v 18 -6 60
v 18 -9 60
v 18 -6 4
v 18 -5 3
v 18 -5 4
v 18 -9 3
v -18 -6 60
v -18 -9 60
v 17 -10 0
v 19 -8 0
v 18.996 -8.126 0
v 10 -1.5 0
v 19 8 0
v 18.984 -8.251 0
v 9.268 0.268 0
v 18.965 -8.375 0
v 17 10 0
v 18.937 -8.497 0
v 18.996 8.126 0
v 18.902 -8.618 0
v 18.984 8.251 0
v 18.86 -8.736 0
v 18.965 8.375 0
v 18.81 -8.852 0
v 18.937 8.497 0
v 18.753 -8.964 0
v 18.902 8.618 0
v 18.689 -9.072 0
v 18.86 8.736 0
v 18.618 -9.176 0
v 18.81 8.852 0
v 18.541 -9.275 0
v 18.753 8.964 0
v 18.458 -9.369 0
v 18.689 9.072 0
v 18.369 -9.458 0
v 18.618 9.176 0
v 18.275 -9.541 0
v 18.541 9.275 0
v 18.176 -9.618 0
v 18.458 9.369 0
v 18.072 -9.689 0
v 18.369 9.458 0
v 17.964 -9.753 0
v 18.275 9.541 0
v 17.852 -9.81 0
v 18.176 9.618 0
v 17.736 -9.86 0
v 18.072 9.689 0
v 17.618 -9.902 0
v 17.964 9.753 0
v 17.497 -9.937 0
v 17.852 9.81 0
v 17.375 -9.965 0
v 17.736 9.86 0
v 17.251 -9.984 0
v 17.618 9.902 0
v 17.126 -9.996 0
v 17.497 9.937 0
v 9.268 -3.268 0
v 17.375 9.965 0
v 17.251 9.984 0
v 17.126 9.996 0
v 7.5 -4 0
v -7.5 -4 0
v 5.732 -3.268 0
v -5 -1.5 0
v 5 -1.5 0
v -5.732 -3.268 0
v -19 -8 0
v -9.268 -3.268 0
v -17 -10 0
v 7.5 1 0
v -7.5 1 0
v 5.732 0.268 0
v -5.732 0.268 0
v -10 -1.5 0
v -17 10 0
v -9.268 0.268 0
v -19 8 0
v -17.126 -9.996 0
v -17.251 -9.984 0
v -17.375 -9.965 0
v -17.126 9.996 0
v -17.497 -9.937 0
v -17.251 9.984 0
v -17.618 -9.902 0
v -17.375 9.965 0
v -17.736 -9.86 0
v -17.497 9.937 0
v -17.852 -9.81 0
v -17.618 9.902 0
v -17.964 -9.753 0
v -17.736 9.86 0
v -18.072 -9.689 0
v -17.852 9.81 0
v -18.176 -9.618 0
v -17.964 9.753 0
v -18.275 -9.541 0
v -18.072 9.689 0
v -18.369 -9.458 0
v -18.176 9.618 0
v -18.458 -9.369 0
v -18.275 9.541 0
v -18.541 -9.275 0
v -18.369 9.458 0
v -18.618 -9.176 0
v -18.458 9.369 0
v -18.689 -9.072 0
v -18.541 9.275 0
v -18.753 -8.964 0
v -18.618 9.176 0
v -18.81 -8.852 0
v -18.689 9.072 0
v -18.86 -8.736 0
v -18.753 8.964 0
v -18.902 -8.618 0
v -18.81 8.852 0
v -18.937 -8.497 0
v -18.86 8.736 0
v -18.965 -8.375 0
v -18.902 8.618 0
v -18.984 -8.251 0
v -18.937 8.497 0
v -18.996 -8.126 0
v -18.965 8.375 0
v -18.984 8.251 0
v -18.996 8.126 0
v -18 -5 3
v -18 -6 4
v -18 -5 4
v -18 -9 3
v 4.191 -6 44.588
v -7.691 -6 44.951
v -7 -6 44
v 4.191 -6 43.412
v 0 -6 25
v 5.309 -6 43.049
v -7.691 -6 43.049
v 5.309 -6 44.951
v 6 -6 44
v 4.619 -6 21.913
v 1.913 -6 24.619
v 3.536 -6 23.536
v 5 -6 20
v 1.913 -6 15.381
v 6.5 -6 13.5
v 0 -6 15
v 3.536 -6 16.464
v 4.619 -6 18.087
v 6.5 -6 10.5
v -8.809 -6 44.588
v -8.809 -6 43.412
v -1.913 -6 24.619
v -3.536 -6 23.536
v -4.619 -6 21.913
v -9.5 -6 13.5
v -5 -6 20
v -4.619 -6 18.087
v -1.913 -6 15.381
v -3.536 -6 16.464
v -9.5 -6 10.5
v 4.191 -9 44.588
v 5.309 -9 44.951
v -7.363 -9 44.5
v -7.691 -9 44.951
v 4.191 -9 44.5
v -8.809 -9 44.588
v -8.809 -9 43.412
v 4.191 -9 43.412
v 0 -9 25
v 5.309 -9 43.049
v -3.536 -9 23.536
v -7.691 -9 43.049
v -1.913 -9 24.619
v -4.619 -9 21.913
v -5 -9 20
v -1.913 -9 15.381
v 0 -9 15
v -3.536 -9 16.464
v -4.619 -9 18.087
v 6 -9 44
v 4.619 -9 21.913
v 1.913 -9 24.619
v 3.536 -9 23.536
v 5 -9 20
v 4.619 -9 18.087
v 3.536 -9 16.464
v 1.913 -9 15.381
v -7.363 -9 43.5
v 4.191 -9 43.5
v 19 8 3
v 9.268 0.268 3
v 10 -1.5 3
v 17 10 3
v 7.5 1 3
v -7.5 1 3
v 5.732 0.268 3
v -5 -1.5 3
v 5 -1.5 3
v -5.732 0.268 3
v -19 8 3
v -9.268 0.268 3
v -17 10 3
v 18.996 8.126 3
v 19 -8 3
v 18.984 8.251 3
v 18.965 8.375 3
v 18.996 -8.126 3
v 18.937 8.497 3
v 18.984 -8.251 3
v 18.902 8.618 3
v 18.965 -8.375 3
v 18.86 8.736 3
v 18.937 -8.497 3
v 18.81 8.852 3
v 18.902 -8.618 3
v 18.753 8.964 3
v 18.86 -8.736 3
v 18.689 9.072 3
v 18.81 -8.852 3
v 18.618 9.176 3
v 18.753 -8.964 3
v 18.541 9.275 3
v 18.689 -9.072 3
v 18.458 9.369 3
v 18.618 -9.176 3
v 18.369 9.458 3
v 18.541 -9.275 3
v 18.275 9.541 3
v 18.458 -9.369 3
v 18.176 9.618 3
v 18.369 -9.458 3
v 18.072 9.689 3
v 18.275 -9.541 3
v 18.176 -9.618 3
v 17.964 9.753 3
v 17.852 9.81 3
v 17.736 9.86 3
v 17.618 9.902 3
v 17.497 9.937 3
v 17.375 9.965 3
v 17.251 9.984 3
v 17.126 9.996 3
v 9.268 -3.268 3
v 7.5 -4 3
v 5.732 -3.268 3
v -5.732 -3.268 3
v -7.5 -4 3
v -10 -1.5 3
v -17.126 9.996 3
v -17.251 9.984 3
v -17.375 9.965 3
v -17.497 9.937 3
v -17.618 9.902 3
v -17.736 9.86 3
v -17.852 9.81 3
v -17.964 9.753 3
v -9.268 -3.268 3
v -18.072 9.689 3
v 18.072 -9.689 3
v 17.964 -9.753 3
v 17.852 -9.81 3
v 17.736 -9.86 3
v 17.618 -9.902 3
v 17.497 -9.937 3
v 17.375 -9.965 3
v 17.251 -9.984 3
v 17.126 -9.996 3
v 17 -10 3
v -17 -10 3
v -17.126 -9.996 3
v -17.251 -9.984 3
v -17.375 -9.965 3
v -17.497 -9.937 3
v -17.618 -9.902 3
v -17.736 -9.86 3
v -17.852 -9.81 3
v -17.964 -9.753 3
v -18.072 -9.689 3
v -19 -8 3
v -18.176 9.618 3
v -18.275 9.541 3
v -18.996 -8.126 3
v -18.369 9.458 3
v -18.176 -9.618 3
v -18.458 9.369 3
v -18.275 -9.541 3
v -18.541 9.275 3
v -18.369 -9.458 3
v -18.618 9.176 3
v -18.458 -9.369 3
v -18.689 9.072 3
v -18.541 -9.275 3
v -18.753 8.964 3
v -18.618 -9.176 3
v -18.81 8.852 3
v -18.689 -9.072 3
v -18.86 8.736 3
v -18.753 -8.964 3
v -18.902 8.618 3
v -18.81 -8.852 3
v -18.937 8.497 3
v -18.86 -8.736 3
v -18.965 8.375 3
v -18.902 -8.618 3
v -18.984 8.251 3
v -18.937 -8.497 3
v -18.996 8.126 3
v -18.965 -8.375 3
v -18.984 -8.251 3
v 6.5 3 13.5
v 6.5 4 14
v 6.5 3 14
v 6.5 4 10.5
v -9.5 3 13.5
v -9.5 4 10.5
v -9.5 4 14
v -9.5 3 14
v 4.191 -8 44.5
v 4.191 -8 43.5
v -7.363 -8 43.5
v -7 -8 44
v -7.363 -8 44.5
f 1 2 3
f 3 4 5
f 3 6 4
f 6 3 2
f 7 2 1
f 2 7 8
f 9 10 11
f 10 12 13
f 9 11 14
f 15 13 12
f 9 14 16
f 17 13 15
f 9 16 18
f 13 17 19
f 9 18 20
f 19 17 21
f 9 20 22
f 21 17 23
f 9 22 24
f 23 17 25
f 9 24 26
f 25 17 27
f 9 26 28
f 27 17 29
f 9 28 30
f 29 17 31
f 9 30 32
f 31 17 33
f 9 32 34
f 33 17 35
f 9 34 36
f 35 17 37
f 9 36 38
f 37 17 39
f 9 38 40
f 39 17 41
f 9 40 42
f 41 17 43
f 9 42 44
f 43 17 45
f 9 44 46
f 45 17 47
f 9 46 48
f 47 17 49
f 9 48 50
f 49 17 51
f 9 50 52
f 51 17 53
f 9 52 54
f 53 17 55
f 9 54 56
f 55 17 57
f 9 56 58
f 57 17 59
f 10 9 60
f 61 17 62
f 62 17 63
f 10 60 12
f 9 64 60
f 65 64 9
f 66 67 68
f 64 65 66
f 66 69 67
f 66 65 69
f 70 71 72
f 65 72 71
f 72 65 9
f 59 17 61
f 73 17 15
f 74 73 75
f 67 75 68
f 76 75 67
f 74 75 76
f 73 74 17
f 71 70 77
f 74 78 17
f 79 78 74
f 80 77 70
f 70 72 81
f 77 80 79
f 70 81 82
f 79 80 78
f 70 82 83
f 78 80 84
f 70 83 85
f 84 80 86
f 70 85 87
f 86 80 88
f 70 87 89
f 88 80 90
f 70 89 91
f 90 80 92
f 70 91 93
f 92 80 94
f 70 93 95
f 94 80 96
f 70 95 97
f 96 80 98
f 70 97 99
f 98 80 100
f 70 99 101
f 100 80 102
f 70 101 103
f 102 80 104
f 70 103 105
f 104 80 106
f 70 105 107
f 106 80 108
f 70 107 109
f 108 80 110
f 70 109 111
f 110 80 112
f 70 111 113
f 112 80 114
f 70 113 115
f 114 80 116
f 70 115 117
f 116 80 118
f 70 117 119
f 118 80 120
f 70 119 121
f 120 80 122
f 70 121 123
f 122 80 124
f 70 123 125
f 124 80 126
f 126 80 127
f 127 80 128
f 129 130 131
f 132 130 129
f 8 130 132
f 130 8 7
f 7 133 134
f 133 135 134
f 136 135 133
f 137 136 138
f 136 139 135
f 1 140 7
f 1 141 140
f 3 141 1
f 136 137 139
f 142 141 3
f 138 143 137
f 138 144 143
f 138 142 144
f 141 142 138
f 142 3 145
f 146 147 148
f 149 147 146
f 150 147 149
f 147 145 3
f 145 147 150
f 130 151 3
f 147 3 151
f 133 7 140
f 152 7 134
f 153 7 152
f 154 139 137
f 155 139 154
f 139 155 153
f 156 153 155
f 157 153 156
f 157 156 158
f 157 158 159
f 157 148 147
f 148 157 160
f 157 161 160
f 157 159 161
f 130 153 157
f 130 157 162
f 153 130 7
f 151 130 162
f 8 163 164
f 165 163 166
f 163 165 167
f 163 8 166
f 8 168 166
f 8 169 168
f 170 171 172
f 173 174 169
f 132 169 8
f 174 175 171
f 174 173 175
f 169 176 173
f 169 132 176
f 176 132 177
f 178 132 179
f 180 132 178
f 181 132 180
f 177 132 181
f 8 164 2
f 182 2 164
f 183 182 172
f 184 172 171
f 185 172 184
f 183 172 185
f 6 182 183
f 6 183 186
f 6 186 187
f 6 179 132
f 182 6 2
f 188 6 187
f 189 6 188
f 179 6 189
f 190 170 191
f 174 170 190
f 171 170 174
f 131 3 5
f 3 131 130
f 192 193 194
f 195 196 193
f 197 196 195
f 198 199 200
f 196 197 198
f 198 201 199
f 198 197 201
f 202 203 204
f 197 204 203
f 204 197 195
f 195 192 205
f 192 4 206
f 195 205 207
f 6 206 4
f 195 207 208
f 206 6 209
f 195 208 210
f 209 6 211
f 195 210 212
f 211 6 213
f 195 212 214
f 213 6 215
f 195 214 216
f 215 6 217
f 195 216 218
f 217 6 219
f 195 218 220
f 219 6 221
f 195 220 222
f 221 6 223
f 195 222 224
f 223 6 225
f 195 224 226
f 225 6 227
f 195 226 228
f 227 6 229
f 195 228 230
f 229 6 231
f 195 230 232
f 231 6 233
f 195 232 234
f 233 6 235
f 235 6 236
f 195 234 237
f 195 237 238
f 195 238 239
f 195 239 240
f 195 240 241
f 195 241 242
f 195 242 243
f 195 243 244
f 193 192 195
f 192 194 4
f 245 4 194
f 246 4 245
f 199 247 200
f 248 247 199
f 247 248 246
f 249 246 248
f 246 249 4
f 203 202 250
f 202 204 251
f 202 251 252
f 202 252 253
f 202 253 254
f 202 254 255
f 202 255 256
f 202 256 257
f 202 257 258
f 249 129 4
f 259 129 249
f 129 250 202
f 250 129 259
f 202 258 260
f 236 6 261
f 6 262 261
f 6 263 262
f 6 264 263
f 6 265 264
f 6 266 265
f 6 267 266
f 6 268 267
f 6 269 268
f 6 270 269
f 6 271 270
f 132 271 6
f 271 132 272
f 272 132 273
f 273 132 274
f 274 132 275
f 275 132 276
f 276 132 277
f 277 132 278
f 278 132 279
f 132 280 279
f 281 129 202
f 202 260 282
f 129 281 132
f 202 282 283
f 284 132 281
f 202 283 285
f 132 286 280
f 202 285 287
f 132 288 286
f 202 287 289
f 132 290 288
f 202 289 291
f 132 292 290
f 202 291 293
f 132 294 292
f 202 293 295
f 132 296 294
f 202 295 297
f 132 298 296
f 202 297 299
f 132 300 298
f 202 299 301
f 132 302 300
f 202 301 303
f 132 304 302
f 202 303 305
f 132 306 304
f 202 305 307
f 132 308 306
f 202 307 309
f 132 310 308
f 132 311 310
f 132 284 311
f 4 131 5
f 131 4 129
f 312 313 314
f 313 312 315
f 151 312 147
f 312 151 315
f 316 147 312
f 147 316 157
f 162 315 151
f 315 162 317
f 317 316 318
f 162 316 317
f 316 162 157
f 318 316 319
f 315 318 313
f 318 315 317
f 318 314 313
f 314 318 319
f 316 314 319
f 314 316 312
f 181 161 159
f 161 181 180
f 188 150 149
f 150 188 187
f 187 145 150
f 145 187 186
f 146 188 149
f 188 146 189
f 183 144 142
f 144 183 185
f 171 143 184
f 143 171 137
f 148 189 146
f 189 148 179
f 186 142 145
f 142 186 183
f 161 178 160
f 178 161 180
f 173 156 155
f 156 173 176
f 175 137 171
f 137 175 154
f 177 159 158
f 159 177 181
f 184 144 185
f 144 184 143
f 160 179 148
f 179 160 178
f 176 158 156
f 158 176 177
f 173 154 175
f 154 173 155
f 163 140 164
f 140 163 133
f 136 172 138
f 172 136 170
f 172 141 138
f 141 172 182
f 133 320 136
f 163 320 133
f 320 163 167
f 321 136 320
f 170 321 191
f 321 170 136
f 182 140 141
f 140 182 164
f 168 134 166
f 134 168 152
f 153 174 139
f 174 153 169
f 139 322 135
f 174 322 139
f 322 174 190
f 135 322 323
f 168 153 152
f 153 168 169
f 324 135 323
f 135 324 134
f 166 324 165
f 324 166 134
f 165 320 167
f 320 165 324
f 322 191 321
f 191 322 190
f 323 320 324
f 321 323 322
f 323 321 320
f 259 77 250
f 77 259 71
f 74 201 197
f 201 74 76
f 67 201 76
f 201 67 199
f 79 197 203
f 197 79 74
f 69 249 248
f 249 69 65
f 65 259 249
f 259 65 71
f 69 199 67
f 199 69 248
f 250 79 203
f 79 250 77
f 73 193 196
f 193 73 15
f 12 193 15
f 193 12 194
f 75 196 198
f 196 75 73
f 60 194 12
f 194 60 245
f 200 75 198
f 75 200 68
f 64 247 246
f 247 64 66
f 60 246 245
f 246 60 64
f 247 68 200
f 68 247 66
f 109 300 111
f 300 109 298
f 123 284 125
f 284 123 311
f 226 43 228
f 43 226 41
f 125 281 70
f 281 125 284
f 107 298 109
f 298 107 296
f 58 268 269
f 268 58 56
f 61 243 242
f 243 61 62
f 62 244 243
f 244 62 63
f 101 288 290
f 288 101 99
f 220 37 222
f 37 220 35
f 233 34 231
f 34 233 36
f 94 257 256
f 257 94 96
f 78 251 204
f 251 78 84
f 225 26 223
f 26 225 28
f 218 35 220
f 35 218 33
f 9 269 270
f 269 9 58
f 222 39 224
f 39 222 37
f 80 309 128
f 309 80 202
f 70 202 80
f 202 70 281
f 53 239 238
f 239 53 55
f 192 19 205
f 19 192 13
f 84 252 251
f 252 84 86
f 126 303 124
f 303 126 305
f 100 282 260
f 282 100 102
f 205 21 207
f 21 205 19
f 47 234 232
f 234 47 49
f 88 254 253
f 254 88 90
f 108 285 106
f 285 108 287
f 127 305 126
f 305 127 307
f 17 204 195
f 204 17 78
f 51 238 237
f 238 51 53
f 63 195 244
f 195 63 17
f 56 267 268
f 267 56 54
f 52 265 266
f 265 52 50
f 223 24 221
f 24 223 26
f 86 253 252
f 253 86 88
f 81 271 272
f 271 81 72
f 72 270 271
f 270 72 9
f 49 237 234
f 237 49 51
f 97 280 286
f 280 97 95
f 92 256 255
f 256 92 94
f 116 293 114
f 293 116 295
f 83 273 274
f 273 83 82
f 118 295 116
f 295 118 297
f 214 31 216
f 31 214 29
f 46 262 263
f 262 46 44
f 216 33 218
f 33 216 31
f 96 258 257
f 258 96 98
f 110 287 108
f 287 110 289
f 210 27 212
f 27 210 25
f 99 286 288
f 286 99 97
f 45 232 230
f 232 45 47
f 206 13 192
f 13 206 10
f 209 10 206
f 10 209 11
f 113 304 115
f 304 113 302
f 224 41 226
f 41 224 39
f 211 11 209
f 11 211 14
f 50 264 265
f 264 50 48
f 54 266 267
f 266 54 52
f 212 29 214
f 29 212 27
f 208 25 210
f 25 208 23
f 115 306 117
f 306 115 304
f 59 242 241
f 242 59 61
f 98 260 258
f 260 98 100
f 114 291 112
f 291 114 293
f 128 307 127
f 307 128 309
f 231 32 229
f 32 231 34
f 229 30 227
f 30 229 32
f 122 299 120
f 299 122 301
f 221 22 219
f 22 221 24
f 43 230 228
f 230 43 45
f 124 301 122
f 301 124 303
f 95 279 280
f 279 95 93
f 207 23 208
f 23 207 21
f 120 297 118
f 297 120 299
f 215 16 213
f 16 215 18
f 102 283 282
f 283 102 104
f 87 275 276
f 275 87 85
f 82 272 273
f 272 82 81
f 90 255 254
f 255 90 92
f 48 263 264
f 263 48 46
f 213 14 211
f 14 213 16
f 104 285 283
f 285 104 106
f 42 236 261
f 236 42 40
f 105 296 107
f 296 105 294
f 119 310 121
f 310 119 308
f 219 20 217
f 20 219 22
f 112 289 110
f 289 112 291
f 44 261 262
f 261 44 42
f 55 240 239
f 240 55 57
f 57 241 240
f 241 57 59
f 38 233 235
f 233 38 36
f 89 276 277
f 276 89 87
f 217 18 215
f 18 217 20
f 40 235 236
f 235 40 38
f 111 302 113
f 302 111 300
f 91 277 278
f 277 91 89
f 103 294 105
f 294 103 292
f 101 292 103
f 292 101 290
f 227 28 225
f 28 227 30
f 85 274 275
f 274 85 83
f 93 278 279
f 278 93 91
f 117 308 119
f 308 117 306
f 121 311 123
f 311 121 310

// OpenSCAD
// Right-side ear and mounting assembly.
thickness  = 3;
mic_radius=5;
fillet = 1;
radius = 2.5;  // Hole radius
bottom_length = 36;
bottom_width = 18;
board_depth = 6;
board_width=16;  // Center of microphone is 6 from edge
ear_hole_height = 20;
vertical_height = 60;
// Returns a plate centered on the origin
module bottom() {
    round_radius=2;  // Radius of the corner arcs
    x = bottom_length;
    y = bottom_width;
    $fn=100;
    linear_extrude(height=thickness) {
        hull() {
            // place 4 circles in the corners, with the given radius
            translate([(-x/2)+(round_radius/2), (-y/2)+(round_radius/2), 0])
            circle(r=round_radius);

            translate([(x/2)-(round_radius/2), (-y/2)+(round_radius/2), 0])
            circle(r=round_radius);

            translate([(-x/2)+(round_radius/2), (y/2)-(round_radius/2), 0])
            circle(r=round_radius);

            translate([(x/2)-(round_radius/2), (y/2)-(round_radius/2), 0])
            circle(r=round_radius);
        }
    }
}

// Include fillet support
module vertical() {
    difference() {
        union() {
            translate([-bottom_length/2,-bottom_width/2,0]) {
                cube([bottom_length,thickness,vertical_height]);
            }
            translate([-bottom_length/2,-bottom_width/2+thickness,thickness]) {
                cube([bottom_length,fillet,fillet]);
            }
            translate([-board_width/2-1.5,-bottom_width/2+thickness,
                        ear_hole_height-mic_radius-3*thickness/2]) {
                cube([board_width,board_depth+thickness+fillet,thickness]);
            }
            translate([-board_width/2-1.5,-bottom_width/2+2*thickness+board_depth,
                        ear_hole_height-mic_radius-thickness+fillet]) {
                cube([board_width,fillet,fillet]);
            }
        }
        translate([0,-bottom_width/2,ear_hole_height]) {
            rotate([-90,0,0]) cylinder(3*thickness,mic_radius,mic_radius,true);
        };
        // 1mm holes. Only way I can think of to fasten board
        translate([mic_radius,-bottom_width/2,ear_hole_height+24]) {
            rotate([-90,0,0]) cylinder(3*thickness,1,1,true);
        }
        // 1mm holes. Only way I can think of to fasten board
        translate([mic_radius-13,-bottom_width/2,ear_hole_height+24]) {
            rotate([-90,0,0]) cylinder(3*thickness,1,1,true);
        }
        // Score a line on the "ear" side for a paper-clip wire
        translate([mic_radius-13,-bottom_width/2,ear_hole_height+24-fillet/2]) {
            cube([13,fillet,fillet]);
        }
    }
}
module holes() {
    x = 10;  // From center
    y = 10 - radius;  // From edge
    for(i=[[-x+radius,-bottom_width/2+y],
           [x-radius,-bottom_width/2+y]] ) {
        translate(i)
        cylinder(r=radius,h=thickness);
    }
}

// For development only. For final we will print separately
// and weld together.
module ear() {
        translate([0,2,0]) {
        rotate([90,-0,0]) import("Ear_right.stl");
    }
}

union() {
    translate([0,-10,20]) {
        //ear();
    }
    vertical();
    difference() {
        bottom();
        holes();
    }
}
